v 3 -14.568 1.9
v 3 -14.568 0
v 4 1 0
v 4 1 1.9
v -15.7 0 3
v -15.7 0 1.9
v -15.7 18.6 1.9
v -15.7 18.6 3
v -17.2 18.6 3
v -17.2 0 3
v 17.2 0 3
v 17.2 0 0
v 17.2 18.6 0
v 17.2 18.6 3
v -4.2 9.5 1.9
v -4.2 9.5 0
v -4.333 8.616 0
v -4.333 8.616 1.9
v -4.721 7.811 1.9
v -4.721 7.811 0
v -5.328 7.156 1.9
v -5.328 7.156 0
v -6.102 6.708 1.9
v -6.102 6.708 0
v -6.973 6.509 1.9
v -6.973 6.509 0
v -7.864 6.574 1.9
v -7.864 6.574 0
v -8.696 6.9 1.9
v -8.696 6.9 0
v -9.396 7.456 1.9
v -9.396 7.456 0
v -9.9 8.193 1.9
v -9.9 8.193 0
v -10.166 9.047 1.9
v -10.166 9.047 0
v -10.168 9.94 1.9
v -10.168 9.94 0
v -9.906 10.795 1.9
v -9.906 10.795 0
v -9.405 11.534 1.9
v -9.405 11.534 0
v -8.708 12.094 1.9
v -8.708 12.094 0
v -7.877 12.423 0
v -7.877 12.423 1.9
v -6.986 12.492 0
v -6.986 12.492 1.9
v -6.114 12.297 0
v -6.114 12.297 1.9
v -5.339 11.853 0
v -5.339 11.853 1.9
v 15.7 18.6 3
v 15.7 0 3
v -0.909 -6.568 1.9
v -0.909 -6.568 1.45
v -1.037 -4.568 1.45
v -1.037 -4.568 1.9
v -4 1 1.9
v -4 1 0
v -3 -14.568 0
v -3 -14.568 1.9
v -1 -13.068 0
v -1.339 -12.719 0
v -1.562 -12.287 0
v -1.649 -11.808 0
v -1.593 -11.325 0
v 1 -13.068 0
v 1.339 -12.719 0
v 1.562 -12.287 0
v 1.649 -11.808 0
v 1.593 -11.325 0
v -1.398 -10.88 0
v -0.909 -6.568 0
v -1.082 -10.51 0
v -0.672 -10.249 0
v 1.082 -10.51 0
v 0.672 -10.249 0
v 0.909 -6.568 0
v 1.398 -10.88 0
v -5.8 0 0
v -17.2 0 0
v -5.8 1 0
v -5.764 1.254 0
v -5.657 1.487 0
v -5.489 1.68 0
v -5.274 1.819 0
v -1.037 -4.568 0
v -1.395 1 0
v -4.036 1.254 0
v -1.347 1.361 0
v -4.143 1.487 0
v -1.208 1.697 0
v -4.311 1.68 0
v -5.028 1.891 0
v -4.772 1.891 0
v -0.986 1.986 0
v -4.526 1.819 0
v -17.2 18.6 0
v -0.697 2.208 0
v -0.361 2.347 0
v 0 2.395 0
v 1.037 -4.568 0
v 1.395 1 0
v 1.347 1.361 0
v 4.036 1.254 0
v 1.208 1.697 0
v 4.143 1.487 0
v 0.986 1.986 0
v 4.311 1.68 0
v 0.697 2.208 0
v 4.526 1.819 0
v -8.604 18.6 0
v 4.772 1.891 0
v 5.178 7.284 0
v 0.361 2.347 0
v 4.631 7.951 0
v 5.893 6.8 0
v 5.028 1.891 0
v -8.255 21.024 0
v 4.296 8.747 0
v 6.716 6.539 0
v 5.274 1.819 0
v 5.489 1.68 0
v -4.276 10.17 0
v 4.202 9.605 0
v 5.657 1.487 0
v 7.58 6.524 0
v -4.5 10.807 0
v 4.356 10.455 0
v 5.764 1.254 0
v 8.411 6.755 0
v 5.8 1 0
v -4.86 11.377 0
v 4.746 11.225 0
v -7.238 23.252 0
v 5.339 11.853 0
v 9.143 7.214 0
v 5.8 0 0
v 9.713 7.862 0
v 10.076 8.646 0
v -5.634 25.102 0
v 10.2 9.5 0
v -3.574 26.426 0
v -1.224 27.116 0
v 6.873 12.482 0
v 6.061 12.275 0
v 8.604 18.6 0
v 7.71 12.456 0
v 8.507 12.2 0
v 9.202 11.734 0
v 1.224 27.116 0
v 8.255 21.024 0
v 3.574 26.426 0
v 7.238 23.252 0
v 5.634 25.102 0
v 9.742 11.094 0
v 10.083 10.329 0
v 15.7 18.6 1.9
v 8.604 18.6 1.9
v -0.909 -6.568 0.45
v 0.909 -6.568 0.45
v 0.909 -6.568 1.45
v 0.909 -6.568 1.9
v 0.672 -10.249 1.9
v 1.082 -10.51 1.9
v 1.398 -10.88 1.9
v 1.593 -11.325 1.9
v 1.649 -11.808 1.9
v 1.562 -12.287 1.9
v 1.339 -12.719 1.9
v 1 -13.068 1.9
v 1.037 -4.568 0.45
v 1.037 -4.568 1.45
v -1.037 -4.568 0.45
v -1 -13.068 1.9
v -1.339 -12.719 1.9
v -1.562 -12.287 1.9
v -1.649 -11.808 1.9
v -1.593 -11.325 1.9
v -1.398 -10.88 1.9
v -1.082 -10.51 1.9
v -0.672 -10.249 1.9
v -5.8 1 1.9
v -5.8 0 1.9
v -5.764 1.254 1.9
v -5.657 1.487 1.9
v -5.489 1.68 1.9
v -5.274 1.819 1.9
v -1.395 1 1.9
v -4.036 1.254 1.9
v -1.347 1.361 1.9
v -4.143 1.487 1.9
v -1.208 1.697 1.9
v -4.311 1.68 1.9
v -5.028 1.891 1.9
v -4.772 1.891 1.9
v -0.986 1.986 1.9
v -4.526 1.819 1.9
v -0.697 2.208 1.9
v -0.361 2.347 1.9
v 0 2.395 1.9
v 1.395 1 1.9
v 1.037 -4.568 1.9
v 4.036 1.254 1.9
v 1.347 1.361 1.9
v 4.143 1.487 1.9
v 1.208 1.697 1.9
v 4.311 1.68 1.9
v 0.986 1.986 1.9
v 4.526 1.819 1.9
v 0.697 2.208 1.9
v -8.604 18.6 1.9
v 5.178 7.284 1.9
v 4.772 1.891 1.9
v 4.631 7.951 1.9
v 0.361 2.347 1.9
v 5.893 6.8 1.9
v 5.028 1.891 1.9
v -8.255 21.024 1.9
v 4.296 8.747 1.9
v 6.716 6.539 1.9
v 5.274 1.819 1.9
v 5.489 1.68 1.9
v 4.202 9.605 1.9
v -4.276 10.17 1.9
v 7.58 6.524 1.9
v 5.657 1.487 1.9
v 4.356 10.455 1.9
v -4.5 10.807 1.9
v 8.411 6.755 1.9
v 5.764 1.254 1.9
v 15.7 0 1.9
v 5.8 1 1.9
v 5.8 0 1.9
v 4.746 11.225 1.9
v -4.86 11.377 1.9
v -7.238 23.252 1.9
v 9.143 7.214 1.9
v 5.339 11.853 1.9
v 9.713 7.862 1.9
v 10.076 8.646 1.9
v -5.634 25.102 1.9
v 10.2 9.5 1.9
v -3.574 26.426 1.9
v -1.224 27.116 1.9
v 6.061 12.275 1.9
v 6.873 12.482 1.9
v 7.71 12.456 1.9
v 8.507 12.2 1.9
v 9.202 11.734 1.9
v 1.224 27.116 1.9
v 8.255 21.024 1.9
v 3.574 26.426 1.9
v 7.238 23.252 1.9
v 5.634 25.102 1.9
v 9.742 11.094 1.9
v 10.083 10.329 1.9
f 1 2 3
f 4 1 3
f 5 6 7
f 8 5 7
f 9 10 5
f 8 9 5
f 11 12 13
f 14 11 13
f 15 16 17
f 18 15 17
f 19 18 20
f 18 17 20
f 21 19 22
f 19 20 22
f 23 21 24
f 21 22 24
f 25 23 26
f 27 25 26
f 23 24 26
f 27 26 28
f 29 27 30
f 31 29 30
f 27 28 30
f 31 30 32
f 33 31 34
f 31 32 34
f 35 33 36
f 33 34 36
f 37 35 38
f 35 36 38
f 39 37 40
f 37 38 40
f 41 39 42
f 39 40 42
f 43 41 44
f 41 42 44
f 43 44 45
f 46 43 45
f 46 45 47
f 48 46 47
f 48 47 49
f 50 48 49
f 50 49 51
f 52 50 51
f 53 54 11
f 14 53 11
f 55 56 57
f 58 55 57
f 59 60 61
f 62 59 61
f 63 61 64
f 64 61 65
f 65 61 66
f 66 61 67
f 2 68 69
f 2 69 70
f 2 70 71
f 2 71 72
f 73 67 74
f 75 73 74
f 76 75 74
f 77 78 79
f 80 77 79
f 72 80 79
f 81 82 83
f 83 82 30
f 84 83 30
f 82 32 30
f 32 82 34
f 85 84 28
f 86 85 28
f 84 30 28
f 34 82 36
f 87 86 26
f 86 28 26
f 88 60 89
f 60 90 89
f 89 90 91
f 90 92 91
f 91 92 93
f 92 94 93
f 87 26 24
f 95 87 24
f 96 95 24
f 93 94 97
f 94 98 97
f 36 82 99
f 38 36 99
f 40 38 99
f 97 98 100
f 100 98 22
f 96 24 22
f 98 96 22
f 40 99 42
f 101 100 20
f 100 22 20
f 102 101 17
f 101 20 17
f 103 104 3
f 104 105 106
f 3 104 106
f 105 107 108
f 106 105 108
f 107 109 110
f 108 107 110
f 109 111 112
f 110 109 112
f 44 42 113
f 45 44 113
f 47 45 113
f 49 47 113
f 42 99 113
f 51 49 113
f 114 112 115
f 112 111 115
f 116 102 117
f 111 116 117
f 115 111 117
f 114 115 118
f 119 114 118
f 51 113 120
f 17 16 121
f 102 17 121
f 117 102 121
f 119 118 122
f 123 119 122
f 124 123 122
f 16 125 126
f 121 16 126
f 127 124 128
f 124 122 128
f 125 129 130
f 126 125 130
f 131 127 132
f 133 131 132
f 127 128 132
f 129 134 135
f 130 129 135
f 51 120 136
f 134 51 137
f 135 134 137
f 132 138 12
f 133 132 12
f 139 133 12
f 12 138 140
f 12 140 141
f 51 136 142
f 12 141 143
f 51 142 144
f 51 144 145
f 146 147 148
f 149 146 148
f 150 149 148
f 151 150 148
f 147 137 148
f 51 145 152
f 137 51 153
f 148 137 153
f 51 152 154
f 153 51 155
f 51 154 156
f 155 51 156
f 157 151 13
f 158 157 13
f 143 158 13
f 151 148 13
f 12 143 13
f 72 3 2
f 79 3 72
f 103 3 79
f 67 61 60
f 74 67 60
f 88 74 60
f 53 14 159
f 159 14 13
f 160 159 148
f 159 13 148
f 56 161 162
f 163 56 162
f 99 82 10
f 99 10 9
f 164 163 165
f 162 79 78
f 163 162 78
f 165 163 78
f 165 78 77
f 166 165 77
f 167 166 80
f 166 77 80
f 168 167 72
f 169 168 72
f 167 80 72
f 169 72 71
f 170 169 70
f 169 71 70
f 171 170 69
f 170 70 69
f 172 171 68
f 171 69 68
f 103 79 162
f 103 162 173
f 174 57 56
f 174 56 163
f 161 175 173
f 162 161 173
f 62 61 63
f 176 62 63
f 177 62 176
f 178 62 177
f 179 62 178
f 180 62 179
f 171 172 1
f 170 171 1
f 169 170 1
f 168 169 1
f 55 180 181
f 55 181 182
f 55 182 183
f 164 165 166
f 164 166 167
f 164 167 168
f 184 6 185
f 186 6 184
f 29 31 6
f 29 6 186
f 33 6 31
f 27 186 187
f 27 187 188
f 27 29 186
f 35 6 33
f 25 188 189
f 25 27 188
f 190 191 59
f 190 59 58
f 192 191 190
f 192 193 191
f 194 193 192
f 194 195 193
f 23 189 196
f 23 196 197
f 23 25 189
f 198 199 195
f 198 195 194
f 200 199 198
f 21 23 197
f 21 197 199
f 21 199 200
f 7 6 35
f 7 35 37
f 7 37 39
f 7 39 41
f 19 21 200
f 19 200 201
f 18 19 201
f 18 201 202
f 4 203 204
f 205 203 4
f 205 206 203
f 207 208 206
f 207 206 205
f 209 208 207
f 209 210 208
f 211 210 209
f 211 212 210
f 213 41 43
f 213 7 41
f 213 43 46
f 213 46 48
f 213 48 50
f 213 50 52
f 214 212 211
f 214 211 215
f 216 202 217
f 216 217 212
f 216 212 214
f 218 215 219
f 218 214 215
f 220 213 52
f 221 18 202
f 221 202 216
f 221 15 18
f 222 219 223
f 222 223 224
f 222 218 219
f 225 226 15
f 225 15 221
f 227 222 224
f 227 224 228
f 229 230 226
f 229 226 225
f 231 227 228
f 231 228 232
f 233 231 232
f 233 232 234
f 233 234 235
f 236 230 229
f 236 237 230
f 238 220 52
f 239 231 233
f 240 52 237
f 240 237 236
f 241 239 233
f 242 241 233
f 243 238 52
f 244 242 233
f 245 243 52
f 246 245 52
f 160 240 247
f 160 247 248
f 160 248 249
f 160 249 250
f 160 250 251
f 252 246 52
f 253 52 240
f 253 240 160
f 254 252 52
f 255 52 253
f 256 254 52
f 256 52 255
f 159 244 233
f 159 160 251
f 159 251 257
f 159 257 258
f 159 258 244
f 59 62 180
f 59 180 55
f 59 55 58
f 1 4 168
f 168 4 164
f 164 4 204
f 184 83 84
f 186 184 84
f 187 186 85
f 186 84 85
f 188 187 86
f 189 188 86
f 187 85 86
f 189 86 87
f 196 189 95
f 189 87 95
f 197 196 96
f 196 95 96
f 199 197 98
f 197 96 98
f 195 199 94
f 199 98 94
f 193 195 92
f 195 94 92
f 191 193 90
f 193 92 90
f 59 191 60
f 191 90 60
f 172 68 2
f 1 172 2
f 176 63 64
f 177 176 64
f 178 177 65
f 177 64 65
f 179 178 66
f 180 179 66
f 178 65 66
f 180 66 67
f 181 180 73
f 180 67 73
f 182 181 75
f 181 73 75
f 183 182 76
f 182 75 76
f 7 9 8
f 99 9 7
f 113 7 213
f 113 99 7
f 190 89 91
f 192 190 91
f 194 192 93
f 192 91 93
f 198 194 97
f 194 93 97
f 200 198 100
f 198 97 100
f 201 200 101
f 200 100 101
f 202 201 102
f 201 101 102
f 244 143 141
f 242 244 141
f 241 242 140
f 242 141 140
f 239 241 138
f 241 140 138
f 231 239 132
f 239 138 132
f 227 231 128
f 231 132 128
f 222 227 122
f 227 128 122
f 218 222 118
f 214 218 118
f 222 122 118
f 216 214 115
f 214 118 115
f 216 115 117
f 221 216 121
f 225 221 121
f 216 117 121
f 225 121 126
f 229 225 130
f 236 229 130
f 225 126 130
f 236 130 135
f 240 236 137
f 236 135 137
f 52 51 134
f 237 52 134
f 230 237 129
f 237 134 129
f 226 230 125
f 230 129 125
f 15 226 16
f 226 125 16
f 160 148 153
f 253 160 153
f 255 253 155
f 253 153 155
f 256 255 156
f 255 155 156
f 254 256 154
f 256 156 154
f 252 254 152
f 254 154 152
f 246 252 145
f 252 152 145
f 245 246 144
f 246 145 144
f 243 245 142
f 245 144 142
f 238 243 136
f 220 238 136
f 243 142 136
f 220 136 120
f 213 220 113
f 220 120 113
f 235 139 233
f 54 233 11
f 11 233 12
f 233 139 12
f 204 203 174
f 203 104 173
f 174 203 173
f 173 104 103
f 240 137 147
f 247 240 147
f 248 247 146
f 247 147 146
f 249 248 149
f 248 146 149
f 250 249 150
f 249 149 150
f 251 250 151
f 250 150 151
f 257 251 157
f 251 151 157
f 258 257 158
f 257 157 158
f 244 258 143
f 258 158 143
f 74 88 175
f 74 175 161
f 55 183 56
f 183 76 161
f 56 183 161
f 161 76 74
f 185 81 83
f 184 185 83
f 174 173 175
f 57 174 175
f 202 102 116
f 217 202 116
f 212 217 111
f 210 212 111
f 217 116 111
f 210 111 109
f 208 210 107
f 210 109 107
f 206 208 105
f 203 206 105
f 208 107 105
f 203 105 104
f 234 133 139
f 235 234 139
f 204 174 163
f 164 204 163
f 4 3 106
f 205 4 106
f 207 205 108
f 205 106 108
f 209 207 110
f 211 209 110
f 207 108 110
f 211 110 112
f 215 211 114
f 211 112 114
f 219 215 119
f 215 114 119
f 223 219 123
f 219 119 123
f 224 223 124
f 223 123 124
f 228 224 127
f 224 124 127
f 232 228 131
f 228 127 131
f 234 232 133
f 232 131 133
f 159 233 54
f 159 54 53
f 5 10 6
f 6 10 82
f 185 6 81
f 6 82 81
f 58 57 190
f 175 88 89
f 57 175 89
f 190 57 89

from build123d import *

# Parameters (mm, degrees)
F1_DEPTH = 1.9
F0_W     = 1.5
F0_H     = 18.6
F2_DEPTH = 3
F3_DEPTH = 1.45
F4_DEPTH = 0.45


with BuildPart() as f1:
    # F0 (on Top) → F1 (new body)
    with BuildSketch(Plane.XY):
        with BuildLine():
            Line((-15.7, 0), (-5.8, 0))
            Line((-5.8, 0), (-5.8, 1))
            ThreePointArc((-5.8, 1), (-4.9, 1.9), (-4, 1))
            Line((-4, 1), (-3, -14.567916))
            Line((-3, -14.567916), (-1, -13.067916))
            ThreePointArc((-1, -13.067916), (-1.638952, -11.564856), (-0.672094, -10.248561))
            Line((-0.672094, -10.248561), (-0.908519, -6.567916))
            Line((-0.908519, -6.567916), (-1.036988, -4.567916))
            Line((-1.036988, -4.567916), (-1.394642, 1))
            ThreePointArc((-1.394642, 1), (-0.986161, 1.986161), (0, 2.394642))
            ThreePointArc((0, 2.394642), (0.986161, 1.986161), (1.394642, 1))
            Line((1.394642, 1), (1.036988, -4.567916))
            Line((1.036988, -4.567916), (0.908519, -6.567916))
            Line((0.908519, -6.567916), (0.672094, -10.248561))
            ThreePointArc((0.672094, -10.248561), (1.638952, -11.564856), (1, -13.067916))
            Line((1, -13.067916), (3, -14.567916))
            Line((3, -14.567916), (4, 1))
            ThreePointArc((4, 1), (4.9, 1.9), (5.8, 1))
            Line((5.8, 1), (5.8, 0))
            Line((5.8, 0), (15.7, 0))
            Line((15.7, 0), (15.7, 18.6))
            Line((15.7, 18.6), (8.603879, 18.6))
            ThreePointArc((8.603879, 18.6), (7.744643, 14.852036), (5.338554, 11.852662))
            ThreePointArc((5.338554, 11.852662), (0, 9.996121), (-5.338553, 11.852662))
            ThreePointArc((-5.338553, 11.852662), (-7.744643, 14.852036), (-8.603879, 18.6))
            Line((-8.603879, 18.6), (-15.7, 18.6))
            Line((-15.7, 18.6), (-15.7, 0))
        make_face()
        with BuildLine():
            ThreePointArc((-4.2, 9.5), (-9.900402, 8.19316), (-5.338553, 11.852662))
            ThreePointArc((-5.338553, 11.852662), (-4.499598, 10.80684), (-4.2, 9.5))
        make_face(mode=Mode.SUBTRACT)
        with BuildLine():
            ThreePointArc((10.2, 9.5), (5.89316, 6.799598), (5.338554, 11.852662))
            ThreePointArc((5.338554, 11.852662), (8.50684, 12.200402), (10.2, 9.5))
        make_face(mode=Mode.SUBTRACT)
        with BuildLine():
            Line((0, 18.6), (-8.603879, 18.6))
            ThreePointArc((-8.603879, 18.6), (-7.744643, 14.852036), (-5.338553, 11.852662))
            ThreePointArc((-5.338553, 11.852662), (0, 9.996121), (5.338554, 11.852662))
            ThreePointArc((5.338554, 11.852662), (7.744643, 14.852036), (8.603879, 18.6))
            Line((8.603879, 18.6), (0, 18.6))
        make_face()
        with BuildLine():
            ThreePointArc((8.603879, 18.6), (0, 27.203879), (-8.603879, 18.6))
            Line((-8.603879, 18.6), (0, 18.6))
            Line((0, 18.6), (8.603879, 18.6))
        make_face()
    extrude(amount=F1_DEPTH)

    # F0 (on Top) → F2 (join)
    with BuildSketch(Plane.XY):
        with Locations((-16.45, 9.3)):
            Rectangle(F0_W, F0_H)
        with Locations((16.45, 9.3)):
            Rectangle(F0_W, F0_H)
    extrude(amount=F2_DEPTH)

    # F0 (on Top) → F3 (join)
    with BuildSketch(Plane.XY):
        Polygon((-1.036988, -4.567916), (-0.908519, -6.567916), (0.908519, -6.567916), (1.036988, -4.567916), align=None)
    extrude(amount=F3_DEPTH)

    # F0 (on Top) → F4 (cut)
    with BuildSketch(Plane.XY):
        Polygon((-1.036988, -4.567916), (-0.908519, -6.567916), (0.908519, -6.567916), (1.036988, -4.567916), align=None)
    extrude(amount=F4_DEPTH, mode=Mode.SUBTRACT)


solid = f1.part
